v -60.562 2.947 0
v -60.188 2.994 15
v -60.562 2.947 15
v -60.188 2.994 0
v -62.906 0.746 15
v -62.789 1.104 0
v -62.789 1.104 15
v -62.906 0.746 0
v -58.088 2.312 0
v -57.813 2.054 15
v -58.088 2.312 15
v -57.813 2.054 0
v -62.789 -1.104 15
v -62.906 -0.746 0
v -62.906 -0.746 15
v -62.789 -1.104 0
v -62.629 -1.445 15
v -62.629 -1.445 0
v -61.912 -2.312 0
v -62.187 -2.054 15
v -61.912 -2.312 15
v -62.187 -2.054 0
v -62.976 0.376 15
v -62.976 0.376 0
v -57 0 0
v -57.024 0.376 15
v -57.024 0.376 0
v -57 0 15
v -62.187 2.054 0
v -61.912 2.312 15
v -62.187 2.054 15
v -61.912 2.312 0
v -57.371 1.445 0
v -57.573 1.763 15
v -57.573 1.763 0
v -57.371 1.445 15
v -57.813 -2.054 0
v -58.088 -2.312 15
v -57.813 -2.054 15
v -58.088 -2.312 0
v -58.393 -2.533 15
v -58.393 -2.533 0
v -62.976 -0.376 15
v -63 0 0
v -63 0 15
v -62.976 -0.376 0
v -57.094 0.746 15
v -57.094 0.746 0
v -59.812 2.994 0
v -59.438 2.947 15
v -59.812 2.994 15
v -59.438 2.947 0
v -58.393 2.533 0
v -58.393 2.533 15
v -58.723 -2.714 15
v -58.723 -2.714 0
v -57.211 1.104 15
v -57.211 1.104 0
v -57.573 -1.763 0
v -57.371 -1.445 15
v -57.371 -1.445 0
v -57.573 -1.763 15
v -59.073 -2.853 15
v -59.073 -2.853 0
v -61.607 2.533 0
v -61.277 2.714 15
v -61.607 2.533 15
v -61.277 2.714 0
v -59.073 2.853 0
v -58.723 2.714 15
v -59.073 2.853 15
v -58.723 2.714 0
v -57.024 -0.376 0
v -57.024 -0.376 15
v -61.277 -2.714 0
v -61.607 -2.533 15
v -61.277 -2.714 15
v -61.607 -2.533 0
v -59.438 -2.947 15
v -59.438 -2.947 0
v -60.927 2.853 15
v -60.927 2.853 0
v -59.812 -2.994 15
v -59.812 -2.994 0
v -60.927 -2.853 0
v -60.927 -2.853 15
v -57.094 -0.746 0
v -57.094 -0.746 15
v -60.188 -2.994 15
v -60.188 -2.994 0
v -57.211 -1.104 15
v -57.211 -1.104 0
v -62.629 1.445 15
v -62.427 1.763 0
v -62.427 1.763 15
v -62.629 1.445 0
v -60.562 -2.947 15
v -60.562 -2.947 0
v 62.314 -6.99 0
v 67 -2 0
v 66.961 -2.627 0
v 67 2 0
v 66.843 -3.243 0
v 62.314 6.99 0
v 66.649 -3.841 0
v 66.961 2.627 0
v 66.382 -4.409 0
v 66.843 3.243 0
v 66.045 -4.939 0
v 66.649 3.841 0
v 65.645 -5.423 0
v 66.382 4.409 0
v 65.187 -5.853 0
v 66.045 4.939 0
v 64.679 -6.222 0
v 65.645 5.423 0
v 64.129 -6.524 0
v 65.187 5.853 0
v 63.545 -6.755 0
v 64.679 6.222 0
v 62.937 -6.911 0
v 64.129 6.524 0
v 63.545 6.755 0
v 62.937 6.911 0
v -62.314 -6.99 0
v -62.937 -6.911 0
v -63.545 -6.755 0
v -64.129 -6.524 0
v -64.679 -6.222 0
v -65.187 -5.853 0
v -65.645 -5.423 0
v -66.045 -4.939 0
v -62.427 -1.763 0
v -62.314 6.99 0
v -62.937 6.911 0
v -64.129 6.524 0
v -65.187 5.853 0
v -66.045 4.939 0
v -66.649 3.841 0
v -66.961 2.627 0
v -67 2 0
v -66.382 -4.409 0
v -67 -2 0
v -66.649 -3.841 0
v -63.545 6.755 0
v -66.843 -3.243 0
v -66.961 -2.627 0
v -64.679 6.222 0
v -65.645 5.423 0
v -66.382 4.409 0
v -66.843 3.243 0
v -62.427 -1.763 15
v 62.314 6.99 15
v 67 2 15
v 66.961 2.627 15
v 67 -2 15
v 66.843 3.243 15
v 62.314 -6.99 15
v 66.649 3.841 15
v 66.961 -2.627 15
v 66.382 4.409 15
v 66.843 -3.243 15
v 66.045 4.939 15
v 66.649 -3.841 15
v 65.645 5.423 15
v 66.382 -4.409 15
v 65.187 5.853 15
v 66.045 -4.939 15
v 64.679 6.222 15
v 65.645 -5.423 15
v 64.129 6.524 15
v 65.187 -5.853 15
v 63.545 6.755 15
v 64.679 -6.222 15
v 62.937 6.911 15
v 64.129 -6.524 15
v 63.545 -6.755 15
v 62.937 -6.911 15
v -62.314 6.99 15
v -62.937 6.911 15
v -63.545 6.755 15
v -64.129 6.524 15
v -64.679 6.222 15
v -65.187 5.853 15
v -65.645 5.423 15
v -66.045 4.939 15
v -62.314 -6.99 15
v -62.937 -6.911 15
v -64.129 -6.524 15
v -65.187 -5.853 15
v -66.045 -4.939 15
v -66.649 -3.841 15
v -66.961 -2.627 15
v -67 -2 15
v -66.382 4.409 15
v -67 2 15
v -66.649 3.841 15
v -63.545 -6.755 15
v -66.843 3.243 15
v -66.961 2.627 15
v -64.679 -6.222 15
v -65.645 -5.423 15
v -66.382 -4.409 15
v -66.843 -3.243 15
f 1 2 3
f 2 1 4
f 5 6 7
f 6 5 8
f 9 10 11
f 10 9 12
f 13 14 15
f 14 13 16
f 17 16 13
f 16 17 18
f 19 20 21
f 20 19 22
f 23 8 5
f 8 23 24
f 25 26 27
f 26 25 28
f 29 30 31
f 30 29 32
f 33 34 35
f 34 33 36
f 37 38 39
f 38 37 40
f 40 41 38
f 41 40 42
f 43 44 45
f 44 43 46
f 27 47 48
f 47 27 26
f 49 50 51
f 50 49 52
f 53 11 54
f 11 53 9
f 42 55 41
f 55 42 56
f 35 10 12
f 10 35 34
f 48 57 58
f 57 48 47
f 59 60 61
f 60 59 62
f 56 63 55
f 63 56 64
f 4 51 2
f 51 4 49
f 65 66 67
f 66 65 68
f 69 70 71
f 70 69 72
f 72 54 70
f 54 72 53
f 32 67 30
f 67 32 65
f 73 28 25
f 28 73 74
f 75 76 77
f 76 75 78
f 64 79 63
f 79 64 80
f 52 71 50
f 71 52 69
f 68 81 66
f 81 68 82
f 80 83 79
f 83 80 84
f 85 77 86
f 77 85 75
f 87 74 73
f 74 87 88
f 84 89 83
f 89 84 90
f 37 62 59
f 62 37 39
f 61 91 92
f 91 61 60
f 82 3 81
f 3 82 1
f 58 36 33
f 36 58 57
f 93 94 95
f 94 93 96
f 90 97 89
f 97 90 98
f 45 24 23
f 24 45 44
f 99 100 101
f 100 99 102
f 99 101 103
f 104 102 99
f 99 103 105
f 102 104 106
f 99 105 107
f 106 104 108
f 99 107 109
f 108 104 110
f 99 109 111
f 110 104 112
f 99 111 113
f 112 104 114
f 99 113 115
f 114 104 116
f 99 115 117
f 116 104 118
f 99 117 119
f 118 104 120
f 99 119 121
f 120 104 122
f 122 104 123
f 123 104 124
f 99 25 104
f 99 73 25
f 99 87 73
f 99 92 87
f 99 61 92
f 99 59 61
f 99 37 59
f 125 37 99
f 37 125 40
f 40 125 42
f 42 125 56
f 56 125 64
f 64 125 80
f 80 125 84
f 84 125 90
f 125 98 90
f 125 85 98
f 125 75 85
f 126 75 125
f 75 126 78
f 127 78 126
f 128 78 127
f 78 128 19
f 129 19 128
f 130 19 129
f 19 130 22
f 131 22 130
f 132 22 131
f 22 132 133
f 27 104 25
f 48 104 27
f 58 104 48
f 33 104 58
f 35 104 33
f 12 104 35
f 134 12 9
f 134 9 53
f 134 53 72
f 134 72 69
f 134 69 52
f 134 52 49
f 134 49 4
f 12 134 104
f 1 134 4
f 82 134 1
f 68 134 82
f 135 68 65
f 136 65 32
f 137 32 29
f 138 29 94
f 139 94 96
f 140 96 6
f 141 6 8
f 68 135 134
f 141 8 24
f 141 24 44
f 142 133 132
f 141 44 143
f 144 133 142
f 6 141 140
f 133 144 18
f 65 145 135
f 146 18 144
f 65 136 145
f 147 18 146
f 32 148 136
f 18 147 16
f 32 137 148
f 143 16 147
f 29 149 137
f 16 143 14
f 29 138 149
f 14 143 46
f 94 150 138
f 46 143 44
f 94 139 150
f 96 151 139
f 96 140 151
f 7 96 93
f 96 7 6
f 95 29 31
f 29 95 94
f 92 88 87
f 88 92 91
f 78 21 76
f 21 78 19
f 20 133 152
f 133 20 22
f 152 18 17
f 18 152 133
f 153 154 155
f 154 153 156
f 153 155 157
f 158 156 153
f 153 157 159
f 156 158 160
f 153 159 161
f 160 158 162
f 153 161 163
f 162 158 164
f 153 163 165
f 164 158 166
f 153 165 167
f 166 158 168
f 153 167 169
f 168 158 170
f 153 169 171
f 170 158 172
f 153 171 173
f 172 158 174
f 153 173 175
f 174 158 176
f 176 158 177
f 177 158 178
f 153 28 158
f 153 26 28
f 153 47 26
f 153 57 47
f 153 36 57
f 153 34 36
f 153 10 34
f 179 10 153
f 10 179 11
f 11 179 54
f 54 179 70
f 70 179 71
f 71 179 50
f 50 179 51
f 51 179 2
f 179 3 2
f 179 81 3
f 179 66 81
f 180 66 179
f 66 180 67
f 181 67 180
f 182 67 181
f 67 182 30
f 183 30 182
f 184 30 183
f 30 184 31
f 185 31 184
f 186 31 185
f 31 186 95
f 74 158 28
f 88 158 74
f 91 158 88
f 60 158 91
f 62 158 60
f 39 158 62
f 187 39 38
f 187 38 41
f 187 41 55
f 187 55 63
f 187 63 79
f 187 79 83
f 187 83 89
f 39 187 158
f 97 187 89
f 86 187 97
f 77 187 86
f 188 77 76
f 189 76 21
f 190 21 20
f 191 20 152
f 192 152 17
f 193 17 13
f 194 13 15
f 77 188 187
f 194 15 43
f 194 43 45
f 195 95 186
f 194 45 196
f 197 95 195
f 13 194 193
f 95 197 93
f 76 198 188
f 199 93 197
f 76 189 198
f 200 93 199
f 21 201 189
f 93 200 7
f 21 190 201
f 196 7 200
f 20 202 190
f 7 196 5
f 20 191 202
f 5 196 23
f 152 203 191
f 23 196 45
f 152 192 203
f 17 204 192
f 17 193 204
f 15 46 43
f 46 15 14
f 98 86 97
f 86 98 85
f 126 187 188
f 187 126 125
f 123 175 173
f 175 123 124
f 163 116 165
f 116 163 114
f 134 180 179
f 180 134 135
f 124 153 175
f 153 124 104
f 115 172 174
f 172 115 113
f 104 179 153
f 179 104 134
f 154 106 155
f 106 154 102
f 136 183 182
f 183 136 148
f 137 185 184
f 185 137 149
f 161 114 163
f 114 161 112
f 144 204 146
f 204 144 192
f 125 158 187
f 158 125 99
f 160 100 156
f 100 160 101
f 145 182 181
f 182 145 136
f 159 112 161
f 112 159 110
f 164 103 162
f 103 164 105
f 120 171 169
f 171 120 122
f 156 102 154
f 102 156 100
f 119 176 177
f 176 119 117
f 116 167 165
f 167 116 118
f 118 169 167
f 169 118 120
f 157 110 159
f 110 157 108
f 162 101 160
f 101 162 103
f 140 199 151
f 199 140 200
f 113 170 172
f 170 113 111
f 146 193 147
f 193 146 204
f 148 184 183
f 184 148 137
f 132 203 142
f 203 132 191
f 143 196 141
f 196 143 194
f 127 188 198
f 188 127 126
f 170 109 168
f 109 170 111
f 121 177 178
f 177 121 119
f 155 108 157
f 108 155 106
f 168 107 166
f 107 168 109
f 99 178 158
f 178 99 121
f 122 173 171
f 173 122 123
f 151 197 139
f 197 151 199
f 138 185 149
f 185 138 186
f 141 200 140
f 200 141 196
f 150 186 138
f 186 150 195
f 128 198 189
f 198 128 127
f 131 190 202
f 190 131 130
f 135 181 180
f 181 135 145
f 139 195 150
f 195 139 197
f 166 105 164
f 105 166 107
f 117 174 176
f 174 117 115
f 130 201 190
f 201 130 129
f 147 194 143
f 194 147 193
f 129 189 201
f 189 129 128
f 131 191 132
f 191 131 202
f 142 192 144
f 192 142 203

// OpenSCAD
$fn = 50;


difference() {
	union() {
		hull() {
			translate(v = [-62.0000000000, 2.0000000000, 0]) {
				cylinder(h = 15, r = 5);
			}
			translate(v = [62.0000000000, 2.0000000000, 0]) {
				cylinder(h = 15, r = 5);
			}
			translate(v = [-62.0000000000, -2.0000000000, 0]) {
				cylinder(h = 15, r = 5);
			}
			translate(v = [62.0000000000, -2.0000000000, 0]) {
				cylinder(h = 15, r = 5);
			}
		}
	}
	union() {
		translate(v = [-60.0000000000, 0.0000000000, 0]) {
			cylinder(h = 15, r = 3.0000000000);
		}
		translate(v = [-60.0000000000, 0.0000000000, 0]) {
			cylinder(h = 15, r = 1.5000000000);
		}
		translate(v = [-60.0000000000, 0.0000000000, 0]) {
			cylinder(h = 15, r = 1.5000000000);
		}
		translate(v = [-60.0000000000, 0.0000000000, 0]) {
			cylinder(h = 15, r = 1.5000000000);
		}
	}
}
